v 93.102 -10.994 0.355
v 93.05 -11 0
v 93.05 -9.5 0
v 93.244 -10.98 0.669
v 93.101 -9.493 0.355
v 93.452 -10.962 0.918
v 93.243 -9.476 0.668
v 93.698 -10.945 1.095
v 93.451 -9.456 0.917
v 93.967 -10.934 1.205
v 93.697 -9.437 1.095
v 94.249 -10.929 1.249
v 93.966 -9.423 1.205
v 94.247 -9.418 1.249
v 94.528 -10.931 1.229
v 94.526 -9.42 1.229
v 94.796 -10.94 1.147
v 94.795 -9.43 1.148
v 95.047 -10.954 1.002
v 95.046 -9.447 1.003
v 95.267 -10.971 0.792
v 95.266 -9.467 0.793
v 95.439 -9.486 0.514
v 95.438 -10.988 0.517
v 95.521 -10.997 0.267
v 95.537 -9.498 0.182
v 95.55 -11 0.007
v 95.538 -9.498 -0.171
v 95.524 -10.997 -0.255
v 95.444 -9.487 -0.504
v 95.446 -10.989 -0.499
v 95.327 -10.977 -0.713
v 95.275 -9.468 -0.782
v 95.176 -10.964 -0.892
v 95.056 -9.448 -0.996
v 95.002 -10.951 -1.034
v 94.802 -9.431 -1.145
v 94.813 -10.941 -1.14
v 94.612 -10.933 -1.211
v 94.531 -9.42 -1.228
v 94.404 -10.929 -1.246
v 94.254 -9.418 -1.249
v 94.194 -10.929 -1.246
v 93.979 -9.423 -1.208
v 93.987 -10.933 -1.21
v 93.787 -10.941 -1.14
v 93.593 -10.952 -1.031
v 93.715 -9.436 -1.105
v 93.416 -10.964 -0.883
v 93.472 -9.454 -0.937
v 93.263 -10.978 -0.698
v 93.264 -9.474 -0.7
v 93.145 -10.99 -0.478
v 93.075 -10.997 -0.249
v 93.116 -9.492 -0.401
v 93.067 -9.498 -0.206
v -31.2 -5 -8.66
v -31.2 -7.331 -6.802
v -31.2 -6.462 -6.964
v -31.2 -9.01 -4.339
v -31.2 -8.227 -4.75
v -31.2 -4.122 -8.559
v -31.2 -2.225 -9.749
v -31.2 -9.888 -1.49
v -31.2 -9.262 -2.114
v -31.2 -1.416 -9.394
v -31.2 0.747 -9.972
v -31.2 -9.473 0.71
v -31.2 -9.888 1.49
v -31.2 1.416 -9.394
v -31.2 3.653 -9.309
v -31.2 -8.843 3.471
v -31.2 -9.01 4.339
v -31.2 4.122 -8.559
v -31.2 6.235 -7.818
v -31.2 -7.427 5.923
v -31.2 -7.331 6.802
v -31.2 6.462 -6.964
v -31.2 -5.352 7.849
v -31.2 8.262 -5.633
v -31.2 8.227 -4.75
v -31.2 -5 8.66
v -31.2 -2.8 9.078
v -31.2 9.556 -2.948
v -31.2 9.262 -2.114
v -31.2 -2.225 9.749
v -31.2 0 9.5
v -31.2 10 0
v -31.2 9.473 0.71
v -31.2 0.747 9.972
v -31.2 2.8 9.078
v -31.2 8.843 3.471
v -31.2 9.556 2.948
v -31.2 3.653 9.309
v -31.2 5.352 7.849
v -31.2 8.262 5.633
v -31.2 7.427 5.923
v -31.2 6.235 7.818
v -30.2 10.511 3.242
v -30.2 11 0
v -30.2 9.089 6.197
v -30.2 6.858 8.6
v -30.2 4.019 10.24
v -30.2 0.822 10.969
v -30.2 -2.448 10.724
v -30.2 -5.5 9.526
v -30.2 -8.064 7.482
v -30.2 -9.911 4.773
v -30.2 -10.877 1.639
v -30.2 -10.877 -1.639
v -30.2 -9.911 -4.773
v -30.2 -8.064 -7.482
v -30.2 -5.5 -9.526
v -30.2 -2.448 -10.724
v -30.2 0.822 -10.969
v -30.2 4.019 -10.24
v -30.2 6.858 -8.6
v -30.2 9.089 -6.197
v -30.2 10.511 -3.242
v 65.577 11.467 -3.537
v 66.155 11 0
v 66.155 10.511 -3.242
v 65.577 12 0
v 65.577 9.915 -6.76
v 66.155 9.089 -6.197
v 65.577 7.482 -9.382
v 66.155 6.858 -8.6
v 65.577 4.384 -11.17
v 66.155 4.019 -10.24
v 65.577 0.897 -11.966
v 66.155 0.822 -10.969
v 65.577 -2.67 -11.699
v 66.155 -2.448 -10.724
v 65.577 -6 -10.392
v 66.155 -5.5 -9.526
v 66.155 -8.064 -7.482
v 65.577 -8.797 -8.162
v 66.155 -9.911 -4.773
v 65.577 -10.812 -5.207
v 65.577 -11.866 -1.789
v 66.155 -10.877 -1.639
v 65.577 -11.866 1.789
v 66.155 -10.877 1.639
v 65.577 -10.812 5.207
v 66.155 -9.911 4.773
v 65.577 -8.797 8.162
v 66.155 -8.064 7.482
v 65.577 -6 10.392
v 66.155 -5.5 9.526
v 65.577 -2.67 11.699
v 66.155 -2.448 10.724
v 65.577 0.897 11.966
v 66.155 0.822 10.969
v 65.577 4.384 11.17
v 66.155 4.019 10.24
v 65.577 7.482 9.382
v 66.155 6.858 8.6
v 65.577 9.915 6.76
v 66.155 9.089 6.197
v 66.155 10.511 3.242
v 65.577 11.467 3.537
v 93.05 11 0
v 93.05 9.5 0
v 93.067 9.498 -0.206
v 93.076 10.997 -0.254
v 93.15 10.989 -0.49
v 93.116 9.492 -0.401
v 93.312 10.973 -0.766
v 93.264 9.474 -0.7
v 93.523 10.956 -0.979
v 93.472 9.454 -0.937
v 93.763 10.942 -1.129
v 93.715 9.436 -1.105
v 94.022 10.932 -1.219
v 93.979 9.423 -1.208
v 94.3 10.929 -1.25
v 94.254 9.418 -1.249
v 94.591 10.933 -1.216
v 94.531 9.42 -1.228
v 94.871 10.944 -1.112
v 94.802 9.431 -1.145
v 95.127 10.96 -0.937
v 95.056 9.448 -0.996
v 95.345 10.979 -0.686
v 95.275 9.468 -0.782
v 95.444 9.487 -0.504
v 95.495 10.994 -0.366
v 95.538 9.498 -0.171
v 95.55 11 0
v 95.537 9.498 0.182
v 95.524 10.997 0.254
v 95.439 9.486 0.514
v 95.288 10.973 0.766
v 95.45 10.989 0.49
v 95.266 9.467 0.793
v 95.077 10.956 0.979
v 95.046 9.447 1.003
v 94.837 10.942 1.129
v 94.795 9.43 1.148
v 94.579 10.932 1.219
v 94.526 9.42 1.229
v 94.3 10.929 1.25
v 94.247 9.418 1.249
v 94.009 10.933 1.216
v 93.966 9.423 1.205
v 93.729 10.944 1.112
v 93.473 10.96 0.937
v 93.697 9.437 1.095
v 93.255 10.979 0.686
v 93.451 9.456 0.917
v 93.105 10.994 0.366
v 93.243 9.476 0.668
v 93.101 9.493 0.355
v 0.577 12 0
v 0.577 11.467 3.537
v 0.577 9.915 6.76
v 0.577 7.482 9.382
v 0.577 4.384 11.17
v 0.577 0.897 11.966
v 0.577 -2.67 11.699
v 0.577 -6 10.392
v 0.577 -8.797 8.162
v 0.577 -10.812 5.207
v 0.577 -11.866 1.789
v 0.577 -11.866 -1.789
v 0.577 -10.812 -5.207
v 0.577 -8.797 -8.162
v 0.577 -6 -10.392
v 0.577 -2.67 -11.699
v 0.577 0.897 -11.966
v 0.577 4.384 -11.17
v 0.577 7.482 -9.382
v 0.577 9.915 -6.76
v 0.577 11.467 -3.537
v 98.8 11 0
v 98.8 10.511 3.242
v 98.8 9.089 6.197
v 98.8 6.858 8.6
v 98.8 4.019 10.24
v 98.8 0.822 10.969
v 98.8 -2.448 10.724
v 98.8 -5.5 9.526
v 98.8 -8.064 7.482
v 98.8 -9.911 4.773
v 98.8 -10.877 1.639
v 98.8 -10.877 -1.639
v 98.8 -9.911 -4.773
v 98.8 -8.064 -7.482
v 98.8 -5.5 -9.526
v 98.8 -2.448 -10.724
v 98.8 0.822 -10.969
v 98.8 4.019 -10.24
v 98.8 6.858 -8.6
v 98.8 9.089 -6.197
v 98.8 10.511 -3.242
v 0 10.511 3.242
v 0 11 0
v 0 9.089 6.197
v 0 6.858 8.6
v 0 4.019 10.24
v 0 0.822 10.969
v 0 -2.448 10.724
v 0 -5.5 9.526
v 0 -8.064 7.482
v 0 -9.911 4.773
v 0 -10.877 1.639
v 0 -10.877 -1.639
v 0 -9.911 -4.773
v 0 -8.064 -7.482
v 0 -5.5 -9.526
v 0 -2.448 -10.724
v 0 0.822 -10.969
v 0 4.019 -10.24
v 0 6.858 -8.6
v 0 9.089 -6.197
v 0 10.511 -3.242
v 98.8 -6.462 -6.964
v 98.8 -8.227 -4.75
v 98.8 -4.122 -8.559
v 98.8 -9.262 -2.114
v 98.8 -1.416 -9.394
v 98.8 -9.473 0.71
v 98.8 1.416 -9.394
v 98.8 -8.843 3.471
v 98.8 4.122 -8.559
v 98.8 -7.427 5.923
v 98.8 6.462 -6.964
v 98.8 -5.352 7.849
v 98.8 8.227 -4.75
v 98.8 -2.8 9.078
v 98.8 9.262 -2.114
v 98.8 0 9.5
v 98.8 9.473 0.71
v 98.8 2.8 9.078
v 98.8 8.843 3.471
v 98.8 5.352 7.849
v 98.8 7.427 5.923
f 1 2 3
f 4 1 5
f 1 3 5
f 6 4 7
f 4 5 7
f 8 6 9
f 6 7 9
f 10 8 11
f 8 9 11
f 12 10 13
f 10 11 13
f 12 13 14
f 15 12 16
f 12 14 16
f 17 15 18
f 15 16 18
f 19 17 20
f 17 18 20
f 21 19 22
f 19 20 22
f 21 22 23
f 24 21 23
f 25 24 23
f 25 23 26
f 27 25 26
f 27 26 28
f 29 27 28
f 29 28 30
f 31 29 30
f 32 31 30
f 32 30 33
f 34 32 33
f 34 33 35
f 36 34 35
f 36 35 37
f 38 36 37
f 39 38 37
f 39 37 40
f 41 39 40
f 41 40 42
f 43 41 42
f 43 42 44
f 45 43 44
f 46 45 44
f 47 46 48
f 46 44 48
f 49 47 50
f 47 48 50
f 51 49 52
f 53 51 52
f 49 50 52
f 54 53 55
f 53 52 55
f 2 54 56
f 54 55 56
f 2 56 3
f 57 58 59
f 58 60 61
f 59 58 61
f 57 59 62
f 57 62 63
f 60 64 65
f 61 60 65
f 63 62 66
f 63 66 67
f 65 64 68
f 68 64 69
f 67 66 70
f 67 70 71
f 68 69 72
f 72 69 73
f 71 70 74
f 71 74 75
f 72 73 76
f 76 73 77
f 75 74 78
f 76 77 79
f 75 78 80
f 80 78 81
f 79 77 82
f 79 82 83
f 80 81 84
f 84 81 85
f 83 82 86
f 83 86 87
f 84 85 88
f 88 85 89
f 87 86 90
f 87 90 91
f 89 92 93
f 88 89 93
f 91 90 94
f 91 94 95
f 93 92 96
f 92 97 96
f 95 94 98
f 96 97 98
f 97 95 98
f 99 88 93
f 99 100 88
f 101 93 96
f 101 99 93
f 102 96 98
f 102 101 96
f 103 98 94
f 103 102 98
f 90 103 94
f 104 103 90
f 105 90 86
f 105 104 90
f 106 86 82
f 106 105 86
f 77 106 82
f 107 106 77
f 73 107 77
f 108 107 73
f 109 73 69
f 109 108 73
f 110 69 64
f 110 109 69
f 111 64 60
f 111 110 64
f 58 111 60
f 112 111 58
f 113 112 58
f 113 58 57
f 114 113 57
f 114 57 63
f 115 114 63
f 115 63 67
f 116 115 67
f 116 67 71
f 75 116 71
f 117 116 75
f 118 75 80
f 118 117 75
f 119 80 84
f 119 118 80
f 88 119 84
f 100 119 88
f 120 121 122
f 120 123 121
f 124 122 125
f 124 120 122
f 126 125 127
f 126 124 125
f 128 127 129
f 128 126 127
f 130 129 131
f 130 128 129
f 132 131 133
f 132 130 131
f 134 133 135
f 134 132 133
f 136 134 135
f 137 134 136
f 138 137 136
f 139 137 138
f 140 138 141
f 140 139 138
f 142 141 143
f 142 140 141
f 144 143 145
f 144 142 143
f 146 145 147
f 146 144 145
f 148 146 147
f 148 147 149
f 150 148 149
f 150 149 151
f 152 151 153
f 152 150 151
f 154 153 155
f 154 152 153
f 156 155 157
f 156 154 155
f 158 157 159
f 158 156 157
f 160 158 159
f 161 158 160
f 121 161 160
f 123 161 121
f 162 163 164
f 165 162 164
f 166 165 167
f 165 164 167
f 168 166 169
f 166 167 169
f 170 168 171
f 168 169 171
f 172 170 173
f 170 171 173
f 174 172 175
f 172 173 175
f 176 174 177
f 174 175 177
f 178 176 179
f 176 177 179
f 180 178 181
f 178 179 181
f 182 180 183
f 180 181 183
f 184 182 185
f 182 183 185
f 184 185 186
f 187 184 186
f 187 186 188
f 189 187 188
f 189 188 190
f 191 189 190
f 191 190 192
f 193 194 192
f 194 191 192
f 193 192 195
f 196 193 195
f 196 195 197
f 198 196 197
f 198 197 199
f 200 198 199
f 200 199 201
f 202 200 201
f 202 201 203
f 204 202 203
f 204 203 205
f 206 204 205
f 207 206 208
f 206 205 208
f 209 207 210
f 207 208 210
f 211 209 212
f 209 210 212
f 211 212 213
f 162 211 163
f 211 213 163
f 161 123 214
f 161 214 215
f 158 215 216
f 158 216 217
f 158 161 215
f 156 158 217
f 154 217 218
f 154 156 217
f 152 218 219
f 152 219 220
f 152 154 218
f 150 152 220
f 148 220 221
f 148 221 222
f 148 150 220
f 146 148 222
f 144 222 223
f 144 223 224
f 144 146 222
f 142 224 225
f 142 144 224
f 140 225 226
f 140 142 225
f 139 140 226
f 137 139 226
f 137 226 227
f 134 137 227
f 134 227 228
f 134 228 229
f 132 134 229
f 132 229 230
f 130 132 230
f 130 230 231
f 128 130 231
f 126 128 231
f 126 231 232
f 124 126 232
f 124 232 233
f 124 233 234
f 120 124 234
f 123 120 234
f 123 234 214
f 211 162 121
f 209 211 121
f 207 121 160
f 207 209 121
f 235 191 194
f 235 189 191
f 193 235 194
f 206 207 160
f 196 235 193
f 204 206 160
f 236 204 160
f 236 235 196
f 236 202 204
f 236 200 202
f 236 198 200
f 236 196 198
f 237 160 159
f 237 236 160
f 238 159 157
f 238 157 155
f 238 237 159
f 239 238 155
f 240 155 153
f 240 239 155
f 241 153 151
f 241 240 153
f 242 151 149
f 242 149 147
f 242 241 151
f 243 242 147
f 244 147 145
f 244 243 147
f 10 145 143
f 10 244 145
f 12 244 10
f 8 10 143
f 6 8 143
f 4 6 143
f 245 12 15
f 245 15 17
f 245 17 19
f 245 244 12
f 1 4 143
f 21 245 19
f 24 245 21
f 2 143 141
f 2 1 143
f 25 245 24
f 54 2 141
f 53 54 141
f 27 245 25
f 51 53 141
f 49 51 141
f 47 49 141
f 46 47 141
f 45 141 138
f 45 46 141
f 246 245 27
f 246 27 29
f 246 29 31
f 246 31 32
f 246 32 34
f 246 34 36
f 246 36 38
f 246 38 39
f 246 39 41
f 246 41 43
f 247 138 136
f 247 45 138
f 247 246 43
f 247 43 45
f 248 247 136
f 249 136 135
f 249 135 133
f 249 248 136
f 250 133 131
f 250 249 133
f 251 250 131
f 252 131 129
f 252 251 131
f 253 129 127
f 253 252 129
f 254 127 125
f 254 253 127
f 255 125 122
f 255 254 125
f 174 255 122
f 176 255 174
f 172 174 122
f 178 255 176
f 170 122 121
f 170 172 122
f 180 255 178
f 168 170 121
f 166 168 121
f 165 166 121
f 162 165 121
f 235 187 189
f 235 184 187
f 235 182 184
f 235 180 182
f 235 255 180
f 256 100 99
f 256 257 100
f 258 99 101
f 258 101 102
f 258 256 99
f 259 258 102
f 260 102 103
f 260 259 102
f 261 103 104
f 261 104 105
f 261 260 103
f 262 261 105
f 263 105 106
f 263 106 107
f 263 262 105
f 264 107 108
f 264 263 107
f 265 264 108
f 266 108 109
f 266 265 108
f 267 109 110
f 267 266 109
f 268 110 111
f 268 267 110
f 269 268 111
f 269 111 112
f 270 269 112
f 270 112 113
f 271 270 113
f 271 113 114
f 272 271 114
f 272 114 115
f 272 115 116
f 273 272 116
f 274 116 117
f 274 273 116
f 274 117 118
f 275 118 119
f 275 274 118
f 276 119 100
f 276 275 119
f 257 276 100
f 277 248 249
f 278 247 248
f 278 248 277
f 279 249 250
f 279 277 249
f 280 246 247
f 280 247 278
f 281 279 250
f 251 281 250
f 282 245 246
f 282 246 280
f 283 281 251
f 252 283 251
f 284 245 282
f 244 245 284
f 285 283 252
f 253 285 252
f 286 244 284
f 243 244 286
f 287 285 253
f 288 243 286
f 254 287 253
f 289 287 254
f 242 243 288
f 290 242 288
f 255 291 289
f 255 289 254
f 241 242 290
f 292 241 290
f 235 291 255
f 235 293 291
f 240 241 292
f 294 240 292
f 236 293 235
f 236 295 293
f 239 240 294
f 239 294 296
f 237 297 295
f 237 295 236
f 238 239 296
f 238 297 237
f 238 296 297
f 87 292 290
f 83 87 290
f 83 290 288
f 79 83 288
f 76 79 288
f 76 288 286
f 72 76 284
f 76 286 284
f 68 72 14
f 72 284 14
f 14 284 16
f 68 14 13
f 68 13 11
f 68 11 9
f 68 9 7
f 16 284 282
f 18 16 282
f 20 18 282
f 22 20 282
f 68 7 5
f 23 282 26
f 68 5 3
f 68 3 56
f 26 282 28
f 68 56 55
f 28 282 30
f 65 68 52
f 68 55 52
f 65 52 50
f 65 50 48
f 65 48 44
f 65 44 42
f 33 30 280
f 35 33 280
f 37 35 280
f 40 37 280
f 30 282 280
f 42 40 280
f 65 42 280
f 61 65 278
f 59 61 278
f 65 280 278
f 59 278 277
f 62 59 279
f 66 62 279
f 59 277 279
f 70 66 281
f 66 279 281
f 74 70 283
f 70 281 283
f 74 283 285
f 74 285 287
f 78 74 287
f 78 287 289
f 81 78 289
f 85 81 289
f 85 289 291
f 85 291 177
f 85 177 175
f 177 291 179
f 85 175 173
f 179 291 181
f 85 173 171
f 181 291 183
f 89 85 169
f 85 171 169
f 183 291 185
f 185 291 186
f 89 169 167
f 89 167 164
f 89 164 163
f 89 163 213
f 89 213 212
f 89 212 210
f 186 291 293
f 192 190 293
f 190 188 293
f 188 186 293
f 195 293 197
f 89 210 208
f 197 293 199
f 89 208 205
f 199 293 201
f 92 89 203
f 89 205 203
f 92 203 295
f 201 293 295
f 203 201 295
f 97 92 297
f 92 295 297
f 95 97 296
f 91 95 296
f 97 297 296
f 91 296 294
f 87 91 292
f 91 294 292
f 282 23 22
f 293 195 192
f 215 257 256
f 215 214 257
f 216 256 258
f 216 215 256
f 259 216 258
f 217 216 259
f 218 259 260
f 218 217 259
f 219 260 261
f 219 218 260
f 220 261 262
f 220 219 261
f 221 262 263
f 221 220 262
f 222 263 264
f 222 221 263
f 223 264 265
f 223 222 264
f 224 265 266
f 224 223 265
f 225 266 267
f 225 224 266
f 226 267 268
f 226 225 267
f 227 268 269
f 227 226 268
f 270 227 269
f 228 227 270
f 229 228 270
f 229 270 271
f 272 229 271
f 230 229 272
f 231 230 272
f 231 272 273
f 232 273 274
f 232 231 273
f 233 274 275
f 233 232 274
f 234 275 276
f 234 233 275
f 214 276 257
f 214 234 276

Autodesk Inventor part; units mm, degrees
ref_plane "YZ Plane" through (0, 0, 0) normal (1, 0, 0) x (0, 1, 0)
ref_plane "XZ Plane" through (0, 0, 0) normal (0, 1, 0) x (-1, 0, 0)
ref_plane "XY Plane" through (0, 0, 0) normal (0, 0, 1) x (1, 0, 0)
sketch "Profile" plane through (0, 0, 0) normal (0, 0, 1) x (1, 0, 0)
  line L0 (-31.2, 0) -> (-31.2, 11)
  line L1 (-31.2, 11) -> (0, 11)
  line L2 (0, 11) -> (0.5774, 12)
  line L3 (0.5774, 12) -> (65.5774, 12)
  line L4 (65.5774, 12) -> (66.1547, 11)
  line L5 (66.1547, 11) -> (98.8, 11)
  line L6 (98.8, 11) -> (98.8, 0)
  line L7 (-31.2, 0) -> (0, 0)
  line L8 (0, 0) -> (0, 9)
  line L9 (0, 9) -> (90.8, 9)
  line L10 (90.8, 9) -> (90.8, 0)
  line L11 (90.8, 0) -> (98.8, 0)
  line L12 (-57.2, 0) -> (124.8, 0) construction
  line L13 (0, 11) -> (0, 9) construction
  dimension "BodyLength" = 130
  dimension "d1" = 11
  dimension "d3" = 120
  dimension "d4" = 120
  dimension "d5" = 65
  dimension "d6" = 31.2
  dimension "d16" = 8
  dimension "d29" = 1
  dimension "d30" = 9
revolve "ProfileRevolveFeature" add sketch "Profile" angle 360 about axis through (-10, 0, 0) along (1, 0, 0)
sketch "InsideHole" plane through (-31.2, 0, 0) normal (-1, 0, 0) x (0, 0, 1)
  circle A0 centre (0, 0) radius 9 construction
hole "InsideHoleFeature" at (-31.2, 0, 0) direction (1, 0, 0) diameter 19 end through all
chamfer "EndChamferFeature" distance 1 angle 45 1 edges at (-31.2, -11, 0)
sketch "CapMountHole" plane through (0, 0, 0) normal (0, 1, 0) x (-1, 0, 0)
  line L0 (-98.8, 11) -> (-98.8, -11) construction
  line L1 (5.32, 0) -> (-31.92, 0) construction
  circle A0 centre (-94.3, 0) radius 1.25
  point P0 (0, 0)
  dimension "d31" = 4.5
  dimension "d39" = 2.5
extrude "CapMountHoleFeature" cut sketch "CapMountHole" along normal through all both and the other way through all
equation "\"d5\" = 0.5 * BodyLength"
equation "\"d6\" = 0.24 * BodyLength"
properties part number "BackPair1PistonBody"
